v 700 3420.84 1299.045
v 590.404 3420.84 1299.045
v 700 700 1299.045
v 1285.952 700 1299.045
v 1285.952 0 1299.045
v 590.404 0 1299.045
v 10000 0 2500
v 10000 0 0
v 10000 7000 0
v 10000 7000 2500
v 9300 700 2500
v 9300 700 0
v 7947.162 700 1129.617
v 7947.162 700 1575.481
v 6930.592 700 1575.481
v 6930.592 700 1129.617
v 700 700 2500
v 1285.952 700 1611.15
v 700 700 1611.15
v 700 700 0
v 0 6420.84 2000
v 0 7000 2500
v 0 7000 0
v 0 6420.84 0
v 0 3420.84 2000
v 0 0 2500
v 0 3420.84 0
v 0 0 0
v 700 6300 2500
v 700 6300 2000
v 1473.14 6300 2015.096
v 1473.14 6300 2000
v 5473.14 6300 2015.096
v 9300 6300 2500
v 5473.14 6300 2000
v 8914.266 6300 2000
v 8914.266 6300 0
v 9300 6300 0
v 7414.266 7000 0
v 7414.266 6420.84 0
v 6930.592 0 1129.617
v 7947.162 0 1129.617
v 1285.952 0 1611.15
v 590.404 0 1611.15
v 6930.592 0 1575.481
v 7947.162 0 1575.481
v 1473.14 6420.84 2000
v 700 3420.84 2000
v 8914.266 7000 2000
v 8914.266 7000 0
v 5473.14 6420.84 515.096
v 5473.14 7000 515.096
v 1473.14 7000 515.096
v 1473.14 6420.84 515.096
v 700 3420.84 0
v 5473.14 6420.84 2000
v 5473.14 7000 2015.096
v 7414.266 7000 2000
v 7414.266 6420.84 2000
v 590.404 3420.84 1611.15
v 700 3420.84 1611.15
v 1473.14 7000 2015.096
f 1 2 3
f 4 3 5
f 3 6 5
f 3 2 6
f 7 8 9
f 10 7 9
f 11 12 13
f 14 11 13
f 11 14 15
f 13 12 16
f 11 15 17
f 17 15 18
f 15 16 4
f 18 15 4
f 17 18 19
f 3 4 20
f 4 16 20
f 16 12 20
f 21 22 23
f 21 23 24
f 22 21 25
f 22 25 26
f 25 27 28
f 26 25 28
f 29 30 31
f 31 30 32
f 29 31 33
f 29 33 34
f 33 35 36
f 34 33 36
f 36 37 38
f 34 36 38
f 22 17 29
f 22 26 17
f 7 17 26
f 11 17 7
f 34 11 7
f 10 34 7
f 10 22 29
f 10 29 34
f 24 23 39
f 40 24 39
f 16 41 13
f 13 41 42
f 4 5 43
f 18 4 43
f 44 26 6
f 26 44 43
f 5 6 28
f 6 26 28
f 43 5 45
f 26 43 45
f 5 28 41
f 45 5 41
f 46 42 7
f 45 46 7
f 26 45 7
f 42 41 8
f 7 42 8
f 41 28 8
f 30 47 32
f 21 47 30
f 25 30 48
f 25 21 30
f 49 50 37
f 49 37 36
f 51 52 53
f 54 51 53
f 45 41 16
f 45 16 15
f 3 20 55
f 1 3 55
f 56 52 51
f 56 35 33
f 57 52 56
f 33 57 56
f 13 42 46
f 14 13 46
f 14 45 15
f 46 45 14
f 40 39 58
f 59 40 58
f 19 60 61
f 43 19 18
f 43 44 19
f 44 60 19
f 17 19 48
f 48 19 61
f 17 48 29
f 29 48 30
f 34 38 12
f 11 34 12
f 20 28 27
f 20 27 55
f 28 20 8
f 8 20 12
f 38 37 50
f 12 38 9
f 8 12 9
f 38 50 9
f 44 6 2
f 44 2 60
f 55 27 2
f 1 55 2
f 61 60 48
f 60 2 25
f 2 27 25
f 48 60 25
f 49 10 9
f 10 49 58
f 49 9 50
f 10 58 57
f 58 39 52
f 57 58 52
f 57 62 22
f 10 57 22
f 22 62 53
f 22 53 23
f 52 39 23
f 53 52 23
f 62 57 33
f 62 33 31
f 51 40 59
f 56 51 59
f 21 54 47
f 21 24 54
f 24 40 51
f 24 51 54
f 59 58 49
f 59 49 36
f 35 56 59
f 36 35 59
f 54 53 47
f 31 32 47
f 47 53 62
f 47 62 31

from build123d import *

# Parameters (mm, degrees)
F0_W     = 5.1603317261
F0_H     = 700
F1_DEPTH = 2500
F2_W     = 1500
F2_H     = 2000
F2_W_2   = 4000
F2_H_2   = 1500
F3_DEPTH = 700
F4_W     = 3000
F4_H     = 2000
F5_DEPTH = 7414.2666326294
F6_W     = 695.5481171608
F6_H     = 312.1048212051
F6_W_2   = 1016.5700912476
F6_H_2   = 445.8640813828
F7_DEPTH = 3420.8407865295


with BuildPart() as f1:
    # F0 (on Top) → F1 (new body)
    with BuildSketch(Plane.XY):
        Polygon((0, 7000), (0, 0), (10000, 0), (10000, 7000), (9300, 7000), (9300, 6300), (9300, 700), (700, 700), (700, 6300), (9294.8396682739, 6300), (9294.8396682739, 7000), align=None)
        with Locations((9297.419834137, 6650)):
            Rectangle(F0_W, F0_H)
    extrude(amount=F1_DEPTH)

    # F2 (on face) → F3 (cut, through all)
    with BuildSketch(Plane(origin=(0, 7000, 0), x_dir=(-1, 0, 0), z_dir=(0, 1, 0))):
        with Locations((-8164.2656326294, 1000)):
            Rectangle(F2_W, F2_H)
        with Locations((-3473.1402397156, 1265.095949173)):
            Rectangle(F2_W_2, F2_H_2)
    extrude(amount=-F3_DEPTH, mode=Mode.SUBTRACT)

    # F4 (on face) → F5 (cut, through all)
    with BuildSketch(Plane(origin=(0, 0, 0), x_dir=(0, -1, 0), z_dir=(-1, 0, 0))):
        with Locations((-4920.8397865295, 1000)):
            Rectangle(F4_W, F4_H)
    extrude(amount=-F5_DEPTH, mode=Mode.SUBTRACT)

    # F6 (on face) → F7 (cut, through all)
    with BuildSketch(Plane.XZ):
        with Locations((938.1779134274, 1455.0974965096)):
            Rectangle(F6_W, F6_H)
        with Locations((7438.8766288757, 1352.5487780571)):
            Rectangle(F6_W_2, F6_H_2)
    extrude(amount=-F7_DEPTH, mode=Mode.SUBTRACT)


solid = f1.part
